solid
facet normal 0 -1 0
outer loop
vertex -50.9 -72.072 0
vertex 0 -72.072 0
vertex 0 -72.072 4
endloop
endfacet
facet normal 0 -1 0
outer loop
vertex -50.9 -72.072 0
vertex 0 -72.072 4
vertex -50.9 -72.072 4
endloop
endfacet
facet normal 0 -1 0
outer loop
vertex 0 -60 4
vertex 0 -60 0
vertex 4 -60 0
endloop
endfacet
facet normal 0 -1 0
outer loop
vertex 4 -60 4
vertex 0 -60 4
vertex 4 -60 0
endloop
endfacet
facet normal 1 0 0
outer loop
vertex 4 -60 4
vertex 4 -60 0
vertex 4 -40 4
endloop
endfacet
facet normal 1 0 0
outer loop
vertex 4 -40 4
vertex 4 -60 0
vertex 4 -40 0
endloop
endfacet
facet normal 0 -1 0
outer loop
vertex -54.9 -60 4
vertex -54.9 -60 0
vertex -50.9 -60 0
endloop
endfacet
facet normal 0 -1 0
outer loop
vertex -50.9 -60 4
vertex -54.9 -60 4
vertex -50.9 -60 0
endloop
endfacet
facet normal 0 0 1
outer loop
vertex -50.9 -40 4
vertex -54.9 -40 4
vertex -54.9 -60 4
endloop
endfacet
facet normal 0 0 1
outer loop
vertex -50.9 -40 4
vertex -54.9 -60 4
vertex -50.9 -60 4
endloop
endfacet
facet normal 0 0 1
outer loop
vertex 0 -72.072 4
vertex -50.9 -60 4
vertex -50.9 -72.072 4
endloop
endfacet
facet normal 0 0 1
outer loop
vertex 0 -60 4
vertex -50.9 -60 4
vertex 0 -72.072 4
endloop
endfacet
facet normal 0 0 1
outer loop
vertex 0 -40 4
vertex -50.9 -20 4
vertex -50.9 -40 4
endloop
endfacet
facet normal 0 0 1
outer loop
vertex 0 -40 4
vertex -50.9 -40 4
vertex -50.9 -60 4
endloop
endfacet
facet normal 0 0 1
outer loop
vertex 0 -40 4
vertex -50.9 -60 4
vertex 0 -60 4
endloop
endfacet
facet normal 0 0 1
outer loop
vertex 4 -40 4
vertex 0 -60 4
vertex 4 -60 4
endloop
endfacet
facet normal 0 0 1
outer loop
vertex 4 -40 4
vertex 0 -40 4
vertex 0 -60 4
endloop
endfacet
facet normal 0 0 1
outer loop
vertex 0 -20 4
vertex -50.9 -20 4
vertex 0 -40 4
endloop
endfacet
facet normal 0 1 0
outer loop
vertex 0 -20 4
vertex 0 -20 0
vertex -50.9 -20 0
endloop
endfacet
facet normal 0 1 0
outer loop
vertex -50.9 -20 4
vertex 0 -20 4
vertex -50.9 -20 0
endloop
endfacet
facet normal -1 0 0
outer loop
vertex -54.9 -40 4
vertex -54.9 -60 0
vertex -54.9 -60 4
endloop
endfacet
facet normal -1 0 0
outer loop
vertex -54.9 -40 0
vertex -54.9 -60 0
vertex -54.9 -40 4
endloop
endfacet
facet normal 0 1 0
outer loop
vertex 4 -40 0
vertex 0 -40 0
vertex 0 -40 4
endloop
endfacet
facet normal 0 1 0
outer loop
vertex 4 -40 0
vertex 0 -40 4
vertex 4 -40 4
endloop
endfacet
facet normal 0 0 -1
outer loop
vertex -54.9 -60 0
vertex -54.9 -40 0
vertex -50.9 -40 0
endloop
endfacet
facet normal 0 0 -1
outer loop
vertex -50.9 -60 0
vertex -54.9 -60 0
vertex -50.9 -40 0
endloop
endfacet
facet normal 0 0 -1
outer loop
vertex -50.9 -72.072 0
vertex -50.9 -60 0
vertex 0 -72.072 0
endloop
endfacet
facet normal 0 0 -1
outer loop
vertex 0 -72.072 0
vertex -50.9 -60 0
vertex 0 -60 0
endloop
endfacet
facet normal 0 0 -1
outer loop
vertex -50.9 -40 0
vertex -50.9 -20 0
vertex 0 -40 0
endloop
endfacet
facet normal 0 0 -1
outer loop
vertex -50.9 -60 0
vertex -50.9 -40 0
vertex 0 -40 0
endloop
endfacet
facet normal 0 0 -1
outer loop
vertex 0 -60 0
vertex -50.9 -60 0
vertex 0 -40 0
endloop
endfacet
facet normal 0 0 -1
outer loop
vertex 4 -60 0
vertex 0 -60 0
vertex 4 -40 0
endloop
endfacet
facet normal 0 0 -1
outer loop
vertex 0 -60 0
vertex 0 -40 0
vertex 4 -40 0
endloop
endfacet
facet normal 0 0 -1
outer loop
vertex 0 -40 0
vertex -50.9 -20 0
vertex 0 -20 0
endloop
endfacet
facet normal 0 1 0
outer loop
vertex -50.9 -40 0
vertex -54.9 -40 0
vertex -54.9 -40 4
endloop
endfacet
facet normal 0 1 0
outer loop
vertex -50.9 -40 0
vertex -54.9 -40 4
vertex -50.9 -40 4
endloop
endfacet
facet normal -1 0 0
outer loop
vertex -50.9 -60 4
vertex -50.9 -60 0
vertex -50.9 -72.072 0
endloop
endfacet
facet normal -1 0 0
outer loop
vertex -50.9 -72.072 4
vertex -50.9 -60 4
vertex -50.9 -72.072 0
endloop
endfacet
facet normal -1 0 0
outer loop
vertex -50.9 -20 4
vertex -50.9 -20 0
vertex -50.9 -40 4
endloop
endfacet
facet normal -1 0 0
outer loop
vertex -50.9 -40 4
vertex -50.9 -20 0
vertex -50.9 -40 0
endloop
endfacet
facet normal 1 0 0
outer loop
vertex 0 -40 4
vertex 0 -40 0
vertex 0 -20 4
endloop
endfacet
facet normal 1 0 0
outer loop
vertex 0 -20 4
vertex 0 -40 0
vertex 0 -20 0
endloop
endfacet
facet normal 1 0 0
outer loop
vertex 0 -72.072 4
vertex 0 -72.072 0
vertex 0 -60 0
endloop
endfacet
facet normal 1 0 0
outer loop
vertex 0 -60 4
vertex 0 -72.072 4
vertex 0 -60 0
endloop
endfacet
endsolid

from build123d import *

# Parameters (mm, degrees)
SKETCH_1_W          = 4
SKETCH_1_H          = 20
EXTRUDE_1_DEPTH     = 4
SKETCH_2_W          = 70.761600996
SKETCH_2_H          = 28.517073099
CUT_EXTRUDE_1_DEPTH = 4
SKETCH_3_W          = 69.96653911
SKETCH_3_H          = 17
CUT_EXTRUDE_2_DEPTH = 10


with BuildPart() as part:
    # Эскиз1 → Бобышка-Вытянуть1 (new body)
    with BuildSketch(Plane.XY):
        with Locations((-52.9, -10)):
            Rectangle(SKETCH_1_W, SKETCH_1_H)
        with Locations((-52.9, -50)):
            Rectangle(SKETCH_1_W, SKETCH_1_H)
        Polygon((0, -20), (0, 0), (-50.9, 0), (-50.9, -20), (-50.9, -40), (-50.9, -60), (-50.9, -80), (-50.9, -89.071572875), (0, -89.071572875), (0, -60), (0, -40), align=None)
        with Locations((2, -10)):
            Rectangle(SKETCH_1_W, SKETCH_1_H)
        with Locations((2, -50)):
            Rectangle(SKETCH_1_W, SKETCH_1_H)
    extrude(amount=EXTRUDE_1_DEPTH)

    # Эскиз2 → Вырез-Вытянуть1 (cut)
    with BuildSketch(Plane(origin=(0, 0, 0), x_dir=(-1, 0, 0), z_dir=(0, 0, -1))):
        with Locations((19.519199502, -5.74146345)):
            Rectangle(SKETCH_2_W, SKETCH_2_H)
    extrude(amount=-CUT_EXTRUDE_1_DEPTH, mode=Mode.SUBTRACT)

    # Эскиз3 → Вырез-Вытянуть2 (cut)
    with BuildSketch(Plane(origin=(0, 0, 0), x_dir=(-1, 0, 0), z_dir=(0, 0, -1))):
        with Locations((15.916730445, -80.571572875)):
            Rectangle(SKETCH_3_W, SKETCH_3_H)
    extrude(amount=-CUT_EXTRUDE_2_DEPTH, mode=Mode.SUBTRACT)


solid = part.part
